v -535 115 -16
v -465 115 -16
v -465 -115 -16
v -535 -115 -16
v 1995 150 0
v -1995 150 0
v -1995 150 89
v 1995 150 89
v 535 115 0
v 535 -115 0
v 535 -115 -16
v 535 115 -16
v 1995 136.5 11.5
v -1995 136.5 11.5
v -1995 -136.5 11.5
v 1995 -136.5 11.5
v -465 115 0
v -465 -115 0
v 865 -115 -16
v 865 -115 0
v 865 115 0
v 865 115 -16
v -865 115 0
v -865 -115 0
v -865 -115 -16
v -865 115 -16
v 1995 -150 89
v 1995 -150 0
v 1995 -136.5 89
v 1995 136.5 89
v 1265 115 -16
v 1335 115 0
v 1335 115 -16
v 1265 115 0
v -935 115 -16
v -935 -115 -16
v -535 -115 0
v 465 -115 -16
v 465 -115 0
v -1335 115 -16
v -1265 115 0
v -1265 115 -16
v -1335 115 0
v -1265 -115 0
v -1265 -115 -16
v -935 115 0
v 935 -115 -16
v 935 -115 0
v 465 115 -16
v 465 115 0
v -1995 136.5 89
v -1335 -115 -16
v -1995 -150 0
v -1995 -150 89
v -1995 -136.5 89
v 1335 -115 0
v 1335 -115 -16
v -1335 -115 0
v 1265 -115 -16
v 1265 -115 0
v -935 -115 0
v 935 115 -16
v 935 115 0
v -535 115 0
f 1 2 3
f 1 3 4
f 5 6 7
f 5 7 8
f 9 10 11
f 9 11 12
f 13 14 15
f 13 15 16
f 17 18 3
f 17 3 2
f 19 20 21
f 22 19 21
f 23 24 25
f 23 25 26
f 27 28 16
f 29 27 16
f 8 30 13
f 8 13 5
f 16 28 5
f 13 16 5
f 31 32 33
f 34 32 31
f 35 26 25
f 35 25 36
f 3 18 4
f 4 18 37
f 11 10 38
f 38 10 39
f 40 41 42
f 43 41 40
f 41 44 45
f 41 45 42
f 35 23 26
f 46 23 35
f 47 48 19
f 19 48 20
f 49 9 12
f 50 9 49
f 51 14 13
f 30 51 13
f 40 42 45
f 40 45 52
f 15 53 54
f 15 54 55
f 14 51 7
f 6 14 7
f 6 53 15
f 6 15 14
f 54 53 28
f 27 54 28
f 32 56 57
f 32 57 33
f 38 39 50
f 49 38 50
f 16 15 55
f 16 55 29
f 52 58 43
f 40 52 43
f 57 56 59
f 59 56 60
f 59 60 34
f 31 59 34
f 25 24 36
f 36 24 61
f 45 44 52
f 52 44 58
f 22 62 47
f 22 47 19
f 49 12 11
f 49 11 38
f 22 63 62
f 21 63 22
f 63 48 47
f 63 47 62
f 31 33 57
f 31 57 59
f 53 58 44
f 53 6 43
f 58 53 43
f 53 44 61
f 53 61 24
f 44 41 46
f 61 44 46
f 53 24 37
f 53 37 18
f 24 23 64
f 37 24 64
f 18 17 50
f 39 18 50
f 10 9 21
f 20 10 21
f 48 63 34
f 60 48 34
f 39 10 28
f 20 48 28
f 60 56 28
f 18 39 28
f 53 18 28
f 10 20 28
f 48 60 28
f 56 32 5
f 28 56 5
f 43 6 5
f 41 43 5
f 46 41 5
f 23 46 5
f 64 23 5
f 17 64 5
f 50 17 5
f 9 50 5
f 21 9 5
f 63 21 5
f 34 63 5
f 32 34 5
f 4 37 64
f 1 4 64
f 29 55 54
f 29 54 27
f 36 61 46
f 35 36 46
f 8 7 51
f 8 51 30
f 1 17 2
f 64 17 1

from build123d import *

# Parameters (mm, degrees)
SKETCH_1_W          = 3990
SKETCH_1_H          = 300
SKETCH_1_R          = 13
EXTRUDE_771_DEPTH   = 11.5
SKETCH_2_W          = 3990
SKETCH_2_H          = 13.5
EXTRUDE_1_DEPTH     = 77.5
SKETCH_3_W          = 70
SKETCH_3_H          = 230
EXTRUDE_2_DEPTH     = 16
SKETCH_4_R          = 13
CUT_EXTRUDE_1_DEPTH = 2004.38463606
SKETCH_5_W          = 3990
SKETCH_5_H          = 273
EXTRUDE_3_DEPTH     = 11.5
SKETCH_6_W          = 70
SKETCH_6_H          = 230
EXTRUDE_4_DEPTH     = 16


with BuildPart() as part:
    # 草图1 → Extrude 771 (new body)
    with BuildSketch(Plane.XY):
        Rectangle(SKETCH_1_W, SKETCH_1_H)
        with Locations((1940, 0)):
            Circle(SKETCH_1_R, mode=Mode.SUBTRACT)
        with Locations((1860, 0)):
            Circle(SKETCH_1_R, mode=Mode.SUBTRACT)
        with Locations((1780, 0)):
            Circle(SKETCH_1_R, mode=Mode.SUBTRACT)
        with Locations((1700, 0)):
            Circle(SKETCH_1_R, mode=Mode.SUBTRACT)
        with Locations((1700, 80)):
            Circle(SKETCH_1_R, mode=Mode.SUBTRACT)
        with Locations((1780, 80)):
            Circle(SKETCH_1_R, mode=Mode.SUBTRACT)
        with Locations((1860, 80)):
            Circle(SKETCH_1_R, mode=Mode.SUBTRACT)
        with Locations((1940, 80)):
            Circle(SKETCH_1_R, mode=Mode.SUBTRACT)
        with Locations(Location((1940, -80, 0), (0, 0, 180))):
            Circle(SKETCH_1_R, mode=Mode.SUBTRACT)
        with Locations(Location((1860, -80, 0), (0, 0, 180))):
            Circle(SKETCH_1_R, mode=Mode.SUBTRACT)
        with Locations(Location((1780, -80, 0), (0, 0, 180))):
            Circle(SKETCH_1_R, mode=Mode.SUBTRACT)
        with Locations(Location((1700, -80, 0), (0, 0, 180))):
            Circle(SKETCH_1_R, mode=Mode.SUBTRACT)
        with Locations((-1700, -80)):
            Circle(SKETCH_1_R, mode=Mode.SUBTRACT)
        with Locations((-1780, -80)):
            Circle(SKETCH_1_R, mode=Mode.SUBTRACT)
        with Locations((-1860, -80)):
            Circle(SKETCH_1_R, mode=Mode.SUBTRACT)
        with Locations((-1940, -80)):
            Circle(SKETCH_1_R, mode=Mode.SUBTRACT)
        with Locations(Location((-1940, 80, 0), (0, 0, 180))):
            Circle(SKETCH_1_R, mode=Mode.SUBTRACT)
        with Locations(Location((-1860, 80, 0), (0, 0, 180))):
            Circle(SKETCH_1_R, mode=Mode.SUBTRACT)
        with Locations(Location((-1780, 80, 0), (0, 0, 180))):
            Circle(SKETCH_1_R, mode=Mode.SUBTRACT)
        with Locations(Location((-1700, 80, 0), (0, 0, 180))):
            Circle(SKETCH_1_R, mode=Mode.SUBTRACT)
        with Locations(Location((-1700, 0, 0), (0, 0, 180))):
            Circle(SKETCH_1_R, mode=Mode.SUBTRACT)
        with Locations(Location((-1780, 0, 0), (0, 0, 180))):
            Circle(SKETCH_1_R, mode=Mode.SUBTRACT)
        with Locations(Location((-1860, 0, 0), (0, 0, 180))):
            Circle(SKETCH_1_R, mode=Mode.SUBTRACT)
        with Locations(Location((-1940, 0, 0), (0, 0, 180))):
            Circle(SKETCH_1_R, mode=Mode.SUBTRACT)
        with Locations((60, 80)):
            Circle(SKETCH_1_R, mode=Mode.SUBTRACT)
        with Locations((140, 80)):
            Circle(SKETCH_1_R, mode=Mode.SUBTRACT)
        with Locations(Location((140, -80, 0), (0, 0, 180))):
            Circle(SKETCH_1_R, mode=Mode.SUBTRACT)
        with Locations(Location((60, -80, 0), (0, 0, 180))):
            Circle(SKETCH_1_R, mode=Mode.SUBTRACT)
        with Locations((-60, -80)):
            Circle(SKETCH_1_R, mode=Mode.SUBTRACT)
        with Locations((-140, -80)):
            Circle(SKETCH_1_R, mode=Mode.SUBTRACT)
        with Locations(Location((-140, 80, 0), (0, 0, 180))):
            Circle(SKETCH_1_R, mode=Mode.SUBTRACT)
        with Locations(Location((-60, 80, 0), (0, 0, 180))):
            Circle(SKETCH_1_R, mode=Mode.SUBTRACT)
    extrude(amount=EXTRUDE_771_DEPTH)

    # 草图2 → 凸台-拉伸1 (add)
    with BuildSketch(Plane.XY.offset(11.5)):
        with Locations((0, 143.25)):
            Rectangle(SKETCH_2_W, SKETCH_2_H)
        with Locations((0, -143.25)):
            Rectangle(SKETCH_2_W, SKETCH_2_H)
    extrude(amount=EXTRUDE_1_DEPTH)

    # 草图3 → 凸台-拉伸2 (add)
    with BuildSketch(Plane(origin=(0, 0, 0), x_dir=(-1, 0, 0), z_dir=(0, 0, -1))):
        with Locations((-1300, 0)):
            Rectangle(SKETCH_3_W, SKETCH_3_H)
        with Locations((-900, 0)):
            Rectangle(SKETCH_3_W, SKETCH_3_H)
        with Locations((-500, 0)):
            Rectangle(SKETCH_3_W, SKETCH_3_H)
        with Locations((500, 0)):
            Rectangle(SKETCH_3_W, SKETCH_3_H)
        with Locations((900, 0)):
            Rectangle(SKETCH_3_W, SKETCH_3_H)
        with Locations((1300, 0)):
            Rectangle(SKETCH_3_W, SKETCH_3_H)
    extrude(amount=EXTRUDE_2_DEPTH)

    # 草图4 → 切除-拉伸1 (cut, through all)
    with BuildSketch(Plane(origin=(0, 0, -16), x_dir=(-1, 0, 0), z_dir=(0, 0, -1))):
        with Locations((-1300, 0)):
            Circle(SKETCH_4_R)
        with Locations((-1300, 80)):
            Circle(SKETCH_4_R)
        with Locations((-900, 80)):
            Circle(SKETCH_4_R)
        with Locations((-900, 0)):
            Circle(SKETCH_4_R)
        with Locations((-500, 80)):
            Circle(SKETCH_4_R)
        with Locations((-500, 0)):
            Circle(SKETCH_4_R)
        with Locations(Location((-500, -80, 0), (0, 0, 180))):
            Circle(SKETCH_4_R)
        with Locations(Location((-900, -80, 0), (0, 0, 180))):
            Circle(SKETCH_4_R)
        with Locations(Location((-1300, -80, 0), (0, 0, 180))):
            Circle(SKETCH_4_R)
        with Locations((1300, -80)):
            Circle(SKETCH_4_R)
        with Locations((900, -80)):
            Circle(SKETCH_4_R)
        with Locations((500, -80)):
            Circle(SKETCH_4_R)
        with Locations(Location((500, 0, 0), (0, 0, 180))):
            Circle(SKETCH_4_R)
        with Locations(Location((500, 80, 0), (0, 0, 180))):
            Circle(SKETCH_4_R)
        with Locations(Location((900, 0, 0), (0, 0, 180))):
            Circle(SKETCH_4_R)
        with Locations(Location((900, 80, 0), (0, 0, 180))):
            Circle(SKETCH_4_R)
        with Locations(Location((1300, 80, 0), (0, 0, 180))):
            Circle(SKETCH_4_R)
        with Locations(Location((1300, 0, 0), (0, 0, 180))):
            Circle(SKETCH_4_R)
    extrude(amount=-CUT_EXTRUDE_1_DEPTH, mode=Mode.SUBTRACT)

    # 草图5 → 凸台-拉伸3 (add)
    with BuildSketch(Plane.XY.offset(11.5)):
        Rectangle(SKETCH_5_W, SKETCH_5_H)
    extrude(amount=-EXTRUDE_3_DEPTH)

    # 草图6 → 凸台-拉伸4 (add)
    with BuildSketch(Plane(origin=(0, 0, 0), x_dir=(-1, 0, 0), z_dir=(0, 0, -1))):
        with Locations((-1300, 0)):
            Rectangle(SKETCH_6_W, SKETCH_6_H)
        with Locations((-900, 0)):
            Rectangle(SKETCH_6_W, SKETCH_6_H)
        with Locations((-500, 0)):
            Rectangle(SKETCH_6_W, SKETCH_6_H)
        with Locations((500, 0)):
            Rectangle(SKETCH_6_W, SKETCH_6_H)
        with Locations((900, 0)):
            Rectangle(SKETCH_6_W, SKETCH_6_H)
        with Locations((1300, 0)):
            Rectangle(SKETCH_6_W, SKETCH_6_H)
    extrude(amount=EXTRUDE_4_DEPTH)


solid = part.part
